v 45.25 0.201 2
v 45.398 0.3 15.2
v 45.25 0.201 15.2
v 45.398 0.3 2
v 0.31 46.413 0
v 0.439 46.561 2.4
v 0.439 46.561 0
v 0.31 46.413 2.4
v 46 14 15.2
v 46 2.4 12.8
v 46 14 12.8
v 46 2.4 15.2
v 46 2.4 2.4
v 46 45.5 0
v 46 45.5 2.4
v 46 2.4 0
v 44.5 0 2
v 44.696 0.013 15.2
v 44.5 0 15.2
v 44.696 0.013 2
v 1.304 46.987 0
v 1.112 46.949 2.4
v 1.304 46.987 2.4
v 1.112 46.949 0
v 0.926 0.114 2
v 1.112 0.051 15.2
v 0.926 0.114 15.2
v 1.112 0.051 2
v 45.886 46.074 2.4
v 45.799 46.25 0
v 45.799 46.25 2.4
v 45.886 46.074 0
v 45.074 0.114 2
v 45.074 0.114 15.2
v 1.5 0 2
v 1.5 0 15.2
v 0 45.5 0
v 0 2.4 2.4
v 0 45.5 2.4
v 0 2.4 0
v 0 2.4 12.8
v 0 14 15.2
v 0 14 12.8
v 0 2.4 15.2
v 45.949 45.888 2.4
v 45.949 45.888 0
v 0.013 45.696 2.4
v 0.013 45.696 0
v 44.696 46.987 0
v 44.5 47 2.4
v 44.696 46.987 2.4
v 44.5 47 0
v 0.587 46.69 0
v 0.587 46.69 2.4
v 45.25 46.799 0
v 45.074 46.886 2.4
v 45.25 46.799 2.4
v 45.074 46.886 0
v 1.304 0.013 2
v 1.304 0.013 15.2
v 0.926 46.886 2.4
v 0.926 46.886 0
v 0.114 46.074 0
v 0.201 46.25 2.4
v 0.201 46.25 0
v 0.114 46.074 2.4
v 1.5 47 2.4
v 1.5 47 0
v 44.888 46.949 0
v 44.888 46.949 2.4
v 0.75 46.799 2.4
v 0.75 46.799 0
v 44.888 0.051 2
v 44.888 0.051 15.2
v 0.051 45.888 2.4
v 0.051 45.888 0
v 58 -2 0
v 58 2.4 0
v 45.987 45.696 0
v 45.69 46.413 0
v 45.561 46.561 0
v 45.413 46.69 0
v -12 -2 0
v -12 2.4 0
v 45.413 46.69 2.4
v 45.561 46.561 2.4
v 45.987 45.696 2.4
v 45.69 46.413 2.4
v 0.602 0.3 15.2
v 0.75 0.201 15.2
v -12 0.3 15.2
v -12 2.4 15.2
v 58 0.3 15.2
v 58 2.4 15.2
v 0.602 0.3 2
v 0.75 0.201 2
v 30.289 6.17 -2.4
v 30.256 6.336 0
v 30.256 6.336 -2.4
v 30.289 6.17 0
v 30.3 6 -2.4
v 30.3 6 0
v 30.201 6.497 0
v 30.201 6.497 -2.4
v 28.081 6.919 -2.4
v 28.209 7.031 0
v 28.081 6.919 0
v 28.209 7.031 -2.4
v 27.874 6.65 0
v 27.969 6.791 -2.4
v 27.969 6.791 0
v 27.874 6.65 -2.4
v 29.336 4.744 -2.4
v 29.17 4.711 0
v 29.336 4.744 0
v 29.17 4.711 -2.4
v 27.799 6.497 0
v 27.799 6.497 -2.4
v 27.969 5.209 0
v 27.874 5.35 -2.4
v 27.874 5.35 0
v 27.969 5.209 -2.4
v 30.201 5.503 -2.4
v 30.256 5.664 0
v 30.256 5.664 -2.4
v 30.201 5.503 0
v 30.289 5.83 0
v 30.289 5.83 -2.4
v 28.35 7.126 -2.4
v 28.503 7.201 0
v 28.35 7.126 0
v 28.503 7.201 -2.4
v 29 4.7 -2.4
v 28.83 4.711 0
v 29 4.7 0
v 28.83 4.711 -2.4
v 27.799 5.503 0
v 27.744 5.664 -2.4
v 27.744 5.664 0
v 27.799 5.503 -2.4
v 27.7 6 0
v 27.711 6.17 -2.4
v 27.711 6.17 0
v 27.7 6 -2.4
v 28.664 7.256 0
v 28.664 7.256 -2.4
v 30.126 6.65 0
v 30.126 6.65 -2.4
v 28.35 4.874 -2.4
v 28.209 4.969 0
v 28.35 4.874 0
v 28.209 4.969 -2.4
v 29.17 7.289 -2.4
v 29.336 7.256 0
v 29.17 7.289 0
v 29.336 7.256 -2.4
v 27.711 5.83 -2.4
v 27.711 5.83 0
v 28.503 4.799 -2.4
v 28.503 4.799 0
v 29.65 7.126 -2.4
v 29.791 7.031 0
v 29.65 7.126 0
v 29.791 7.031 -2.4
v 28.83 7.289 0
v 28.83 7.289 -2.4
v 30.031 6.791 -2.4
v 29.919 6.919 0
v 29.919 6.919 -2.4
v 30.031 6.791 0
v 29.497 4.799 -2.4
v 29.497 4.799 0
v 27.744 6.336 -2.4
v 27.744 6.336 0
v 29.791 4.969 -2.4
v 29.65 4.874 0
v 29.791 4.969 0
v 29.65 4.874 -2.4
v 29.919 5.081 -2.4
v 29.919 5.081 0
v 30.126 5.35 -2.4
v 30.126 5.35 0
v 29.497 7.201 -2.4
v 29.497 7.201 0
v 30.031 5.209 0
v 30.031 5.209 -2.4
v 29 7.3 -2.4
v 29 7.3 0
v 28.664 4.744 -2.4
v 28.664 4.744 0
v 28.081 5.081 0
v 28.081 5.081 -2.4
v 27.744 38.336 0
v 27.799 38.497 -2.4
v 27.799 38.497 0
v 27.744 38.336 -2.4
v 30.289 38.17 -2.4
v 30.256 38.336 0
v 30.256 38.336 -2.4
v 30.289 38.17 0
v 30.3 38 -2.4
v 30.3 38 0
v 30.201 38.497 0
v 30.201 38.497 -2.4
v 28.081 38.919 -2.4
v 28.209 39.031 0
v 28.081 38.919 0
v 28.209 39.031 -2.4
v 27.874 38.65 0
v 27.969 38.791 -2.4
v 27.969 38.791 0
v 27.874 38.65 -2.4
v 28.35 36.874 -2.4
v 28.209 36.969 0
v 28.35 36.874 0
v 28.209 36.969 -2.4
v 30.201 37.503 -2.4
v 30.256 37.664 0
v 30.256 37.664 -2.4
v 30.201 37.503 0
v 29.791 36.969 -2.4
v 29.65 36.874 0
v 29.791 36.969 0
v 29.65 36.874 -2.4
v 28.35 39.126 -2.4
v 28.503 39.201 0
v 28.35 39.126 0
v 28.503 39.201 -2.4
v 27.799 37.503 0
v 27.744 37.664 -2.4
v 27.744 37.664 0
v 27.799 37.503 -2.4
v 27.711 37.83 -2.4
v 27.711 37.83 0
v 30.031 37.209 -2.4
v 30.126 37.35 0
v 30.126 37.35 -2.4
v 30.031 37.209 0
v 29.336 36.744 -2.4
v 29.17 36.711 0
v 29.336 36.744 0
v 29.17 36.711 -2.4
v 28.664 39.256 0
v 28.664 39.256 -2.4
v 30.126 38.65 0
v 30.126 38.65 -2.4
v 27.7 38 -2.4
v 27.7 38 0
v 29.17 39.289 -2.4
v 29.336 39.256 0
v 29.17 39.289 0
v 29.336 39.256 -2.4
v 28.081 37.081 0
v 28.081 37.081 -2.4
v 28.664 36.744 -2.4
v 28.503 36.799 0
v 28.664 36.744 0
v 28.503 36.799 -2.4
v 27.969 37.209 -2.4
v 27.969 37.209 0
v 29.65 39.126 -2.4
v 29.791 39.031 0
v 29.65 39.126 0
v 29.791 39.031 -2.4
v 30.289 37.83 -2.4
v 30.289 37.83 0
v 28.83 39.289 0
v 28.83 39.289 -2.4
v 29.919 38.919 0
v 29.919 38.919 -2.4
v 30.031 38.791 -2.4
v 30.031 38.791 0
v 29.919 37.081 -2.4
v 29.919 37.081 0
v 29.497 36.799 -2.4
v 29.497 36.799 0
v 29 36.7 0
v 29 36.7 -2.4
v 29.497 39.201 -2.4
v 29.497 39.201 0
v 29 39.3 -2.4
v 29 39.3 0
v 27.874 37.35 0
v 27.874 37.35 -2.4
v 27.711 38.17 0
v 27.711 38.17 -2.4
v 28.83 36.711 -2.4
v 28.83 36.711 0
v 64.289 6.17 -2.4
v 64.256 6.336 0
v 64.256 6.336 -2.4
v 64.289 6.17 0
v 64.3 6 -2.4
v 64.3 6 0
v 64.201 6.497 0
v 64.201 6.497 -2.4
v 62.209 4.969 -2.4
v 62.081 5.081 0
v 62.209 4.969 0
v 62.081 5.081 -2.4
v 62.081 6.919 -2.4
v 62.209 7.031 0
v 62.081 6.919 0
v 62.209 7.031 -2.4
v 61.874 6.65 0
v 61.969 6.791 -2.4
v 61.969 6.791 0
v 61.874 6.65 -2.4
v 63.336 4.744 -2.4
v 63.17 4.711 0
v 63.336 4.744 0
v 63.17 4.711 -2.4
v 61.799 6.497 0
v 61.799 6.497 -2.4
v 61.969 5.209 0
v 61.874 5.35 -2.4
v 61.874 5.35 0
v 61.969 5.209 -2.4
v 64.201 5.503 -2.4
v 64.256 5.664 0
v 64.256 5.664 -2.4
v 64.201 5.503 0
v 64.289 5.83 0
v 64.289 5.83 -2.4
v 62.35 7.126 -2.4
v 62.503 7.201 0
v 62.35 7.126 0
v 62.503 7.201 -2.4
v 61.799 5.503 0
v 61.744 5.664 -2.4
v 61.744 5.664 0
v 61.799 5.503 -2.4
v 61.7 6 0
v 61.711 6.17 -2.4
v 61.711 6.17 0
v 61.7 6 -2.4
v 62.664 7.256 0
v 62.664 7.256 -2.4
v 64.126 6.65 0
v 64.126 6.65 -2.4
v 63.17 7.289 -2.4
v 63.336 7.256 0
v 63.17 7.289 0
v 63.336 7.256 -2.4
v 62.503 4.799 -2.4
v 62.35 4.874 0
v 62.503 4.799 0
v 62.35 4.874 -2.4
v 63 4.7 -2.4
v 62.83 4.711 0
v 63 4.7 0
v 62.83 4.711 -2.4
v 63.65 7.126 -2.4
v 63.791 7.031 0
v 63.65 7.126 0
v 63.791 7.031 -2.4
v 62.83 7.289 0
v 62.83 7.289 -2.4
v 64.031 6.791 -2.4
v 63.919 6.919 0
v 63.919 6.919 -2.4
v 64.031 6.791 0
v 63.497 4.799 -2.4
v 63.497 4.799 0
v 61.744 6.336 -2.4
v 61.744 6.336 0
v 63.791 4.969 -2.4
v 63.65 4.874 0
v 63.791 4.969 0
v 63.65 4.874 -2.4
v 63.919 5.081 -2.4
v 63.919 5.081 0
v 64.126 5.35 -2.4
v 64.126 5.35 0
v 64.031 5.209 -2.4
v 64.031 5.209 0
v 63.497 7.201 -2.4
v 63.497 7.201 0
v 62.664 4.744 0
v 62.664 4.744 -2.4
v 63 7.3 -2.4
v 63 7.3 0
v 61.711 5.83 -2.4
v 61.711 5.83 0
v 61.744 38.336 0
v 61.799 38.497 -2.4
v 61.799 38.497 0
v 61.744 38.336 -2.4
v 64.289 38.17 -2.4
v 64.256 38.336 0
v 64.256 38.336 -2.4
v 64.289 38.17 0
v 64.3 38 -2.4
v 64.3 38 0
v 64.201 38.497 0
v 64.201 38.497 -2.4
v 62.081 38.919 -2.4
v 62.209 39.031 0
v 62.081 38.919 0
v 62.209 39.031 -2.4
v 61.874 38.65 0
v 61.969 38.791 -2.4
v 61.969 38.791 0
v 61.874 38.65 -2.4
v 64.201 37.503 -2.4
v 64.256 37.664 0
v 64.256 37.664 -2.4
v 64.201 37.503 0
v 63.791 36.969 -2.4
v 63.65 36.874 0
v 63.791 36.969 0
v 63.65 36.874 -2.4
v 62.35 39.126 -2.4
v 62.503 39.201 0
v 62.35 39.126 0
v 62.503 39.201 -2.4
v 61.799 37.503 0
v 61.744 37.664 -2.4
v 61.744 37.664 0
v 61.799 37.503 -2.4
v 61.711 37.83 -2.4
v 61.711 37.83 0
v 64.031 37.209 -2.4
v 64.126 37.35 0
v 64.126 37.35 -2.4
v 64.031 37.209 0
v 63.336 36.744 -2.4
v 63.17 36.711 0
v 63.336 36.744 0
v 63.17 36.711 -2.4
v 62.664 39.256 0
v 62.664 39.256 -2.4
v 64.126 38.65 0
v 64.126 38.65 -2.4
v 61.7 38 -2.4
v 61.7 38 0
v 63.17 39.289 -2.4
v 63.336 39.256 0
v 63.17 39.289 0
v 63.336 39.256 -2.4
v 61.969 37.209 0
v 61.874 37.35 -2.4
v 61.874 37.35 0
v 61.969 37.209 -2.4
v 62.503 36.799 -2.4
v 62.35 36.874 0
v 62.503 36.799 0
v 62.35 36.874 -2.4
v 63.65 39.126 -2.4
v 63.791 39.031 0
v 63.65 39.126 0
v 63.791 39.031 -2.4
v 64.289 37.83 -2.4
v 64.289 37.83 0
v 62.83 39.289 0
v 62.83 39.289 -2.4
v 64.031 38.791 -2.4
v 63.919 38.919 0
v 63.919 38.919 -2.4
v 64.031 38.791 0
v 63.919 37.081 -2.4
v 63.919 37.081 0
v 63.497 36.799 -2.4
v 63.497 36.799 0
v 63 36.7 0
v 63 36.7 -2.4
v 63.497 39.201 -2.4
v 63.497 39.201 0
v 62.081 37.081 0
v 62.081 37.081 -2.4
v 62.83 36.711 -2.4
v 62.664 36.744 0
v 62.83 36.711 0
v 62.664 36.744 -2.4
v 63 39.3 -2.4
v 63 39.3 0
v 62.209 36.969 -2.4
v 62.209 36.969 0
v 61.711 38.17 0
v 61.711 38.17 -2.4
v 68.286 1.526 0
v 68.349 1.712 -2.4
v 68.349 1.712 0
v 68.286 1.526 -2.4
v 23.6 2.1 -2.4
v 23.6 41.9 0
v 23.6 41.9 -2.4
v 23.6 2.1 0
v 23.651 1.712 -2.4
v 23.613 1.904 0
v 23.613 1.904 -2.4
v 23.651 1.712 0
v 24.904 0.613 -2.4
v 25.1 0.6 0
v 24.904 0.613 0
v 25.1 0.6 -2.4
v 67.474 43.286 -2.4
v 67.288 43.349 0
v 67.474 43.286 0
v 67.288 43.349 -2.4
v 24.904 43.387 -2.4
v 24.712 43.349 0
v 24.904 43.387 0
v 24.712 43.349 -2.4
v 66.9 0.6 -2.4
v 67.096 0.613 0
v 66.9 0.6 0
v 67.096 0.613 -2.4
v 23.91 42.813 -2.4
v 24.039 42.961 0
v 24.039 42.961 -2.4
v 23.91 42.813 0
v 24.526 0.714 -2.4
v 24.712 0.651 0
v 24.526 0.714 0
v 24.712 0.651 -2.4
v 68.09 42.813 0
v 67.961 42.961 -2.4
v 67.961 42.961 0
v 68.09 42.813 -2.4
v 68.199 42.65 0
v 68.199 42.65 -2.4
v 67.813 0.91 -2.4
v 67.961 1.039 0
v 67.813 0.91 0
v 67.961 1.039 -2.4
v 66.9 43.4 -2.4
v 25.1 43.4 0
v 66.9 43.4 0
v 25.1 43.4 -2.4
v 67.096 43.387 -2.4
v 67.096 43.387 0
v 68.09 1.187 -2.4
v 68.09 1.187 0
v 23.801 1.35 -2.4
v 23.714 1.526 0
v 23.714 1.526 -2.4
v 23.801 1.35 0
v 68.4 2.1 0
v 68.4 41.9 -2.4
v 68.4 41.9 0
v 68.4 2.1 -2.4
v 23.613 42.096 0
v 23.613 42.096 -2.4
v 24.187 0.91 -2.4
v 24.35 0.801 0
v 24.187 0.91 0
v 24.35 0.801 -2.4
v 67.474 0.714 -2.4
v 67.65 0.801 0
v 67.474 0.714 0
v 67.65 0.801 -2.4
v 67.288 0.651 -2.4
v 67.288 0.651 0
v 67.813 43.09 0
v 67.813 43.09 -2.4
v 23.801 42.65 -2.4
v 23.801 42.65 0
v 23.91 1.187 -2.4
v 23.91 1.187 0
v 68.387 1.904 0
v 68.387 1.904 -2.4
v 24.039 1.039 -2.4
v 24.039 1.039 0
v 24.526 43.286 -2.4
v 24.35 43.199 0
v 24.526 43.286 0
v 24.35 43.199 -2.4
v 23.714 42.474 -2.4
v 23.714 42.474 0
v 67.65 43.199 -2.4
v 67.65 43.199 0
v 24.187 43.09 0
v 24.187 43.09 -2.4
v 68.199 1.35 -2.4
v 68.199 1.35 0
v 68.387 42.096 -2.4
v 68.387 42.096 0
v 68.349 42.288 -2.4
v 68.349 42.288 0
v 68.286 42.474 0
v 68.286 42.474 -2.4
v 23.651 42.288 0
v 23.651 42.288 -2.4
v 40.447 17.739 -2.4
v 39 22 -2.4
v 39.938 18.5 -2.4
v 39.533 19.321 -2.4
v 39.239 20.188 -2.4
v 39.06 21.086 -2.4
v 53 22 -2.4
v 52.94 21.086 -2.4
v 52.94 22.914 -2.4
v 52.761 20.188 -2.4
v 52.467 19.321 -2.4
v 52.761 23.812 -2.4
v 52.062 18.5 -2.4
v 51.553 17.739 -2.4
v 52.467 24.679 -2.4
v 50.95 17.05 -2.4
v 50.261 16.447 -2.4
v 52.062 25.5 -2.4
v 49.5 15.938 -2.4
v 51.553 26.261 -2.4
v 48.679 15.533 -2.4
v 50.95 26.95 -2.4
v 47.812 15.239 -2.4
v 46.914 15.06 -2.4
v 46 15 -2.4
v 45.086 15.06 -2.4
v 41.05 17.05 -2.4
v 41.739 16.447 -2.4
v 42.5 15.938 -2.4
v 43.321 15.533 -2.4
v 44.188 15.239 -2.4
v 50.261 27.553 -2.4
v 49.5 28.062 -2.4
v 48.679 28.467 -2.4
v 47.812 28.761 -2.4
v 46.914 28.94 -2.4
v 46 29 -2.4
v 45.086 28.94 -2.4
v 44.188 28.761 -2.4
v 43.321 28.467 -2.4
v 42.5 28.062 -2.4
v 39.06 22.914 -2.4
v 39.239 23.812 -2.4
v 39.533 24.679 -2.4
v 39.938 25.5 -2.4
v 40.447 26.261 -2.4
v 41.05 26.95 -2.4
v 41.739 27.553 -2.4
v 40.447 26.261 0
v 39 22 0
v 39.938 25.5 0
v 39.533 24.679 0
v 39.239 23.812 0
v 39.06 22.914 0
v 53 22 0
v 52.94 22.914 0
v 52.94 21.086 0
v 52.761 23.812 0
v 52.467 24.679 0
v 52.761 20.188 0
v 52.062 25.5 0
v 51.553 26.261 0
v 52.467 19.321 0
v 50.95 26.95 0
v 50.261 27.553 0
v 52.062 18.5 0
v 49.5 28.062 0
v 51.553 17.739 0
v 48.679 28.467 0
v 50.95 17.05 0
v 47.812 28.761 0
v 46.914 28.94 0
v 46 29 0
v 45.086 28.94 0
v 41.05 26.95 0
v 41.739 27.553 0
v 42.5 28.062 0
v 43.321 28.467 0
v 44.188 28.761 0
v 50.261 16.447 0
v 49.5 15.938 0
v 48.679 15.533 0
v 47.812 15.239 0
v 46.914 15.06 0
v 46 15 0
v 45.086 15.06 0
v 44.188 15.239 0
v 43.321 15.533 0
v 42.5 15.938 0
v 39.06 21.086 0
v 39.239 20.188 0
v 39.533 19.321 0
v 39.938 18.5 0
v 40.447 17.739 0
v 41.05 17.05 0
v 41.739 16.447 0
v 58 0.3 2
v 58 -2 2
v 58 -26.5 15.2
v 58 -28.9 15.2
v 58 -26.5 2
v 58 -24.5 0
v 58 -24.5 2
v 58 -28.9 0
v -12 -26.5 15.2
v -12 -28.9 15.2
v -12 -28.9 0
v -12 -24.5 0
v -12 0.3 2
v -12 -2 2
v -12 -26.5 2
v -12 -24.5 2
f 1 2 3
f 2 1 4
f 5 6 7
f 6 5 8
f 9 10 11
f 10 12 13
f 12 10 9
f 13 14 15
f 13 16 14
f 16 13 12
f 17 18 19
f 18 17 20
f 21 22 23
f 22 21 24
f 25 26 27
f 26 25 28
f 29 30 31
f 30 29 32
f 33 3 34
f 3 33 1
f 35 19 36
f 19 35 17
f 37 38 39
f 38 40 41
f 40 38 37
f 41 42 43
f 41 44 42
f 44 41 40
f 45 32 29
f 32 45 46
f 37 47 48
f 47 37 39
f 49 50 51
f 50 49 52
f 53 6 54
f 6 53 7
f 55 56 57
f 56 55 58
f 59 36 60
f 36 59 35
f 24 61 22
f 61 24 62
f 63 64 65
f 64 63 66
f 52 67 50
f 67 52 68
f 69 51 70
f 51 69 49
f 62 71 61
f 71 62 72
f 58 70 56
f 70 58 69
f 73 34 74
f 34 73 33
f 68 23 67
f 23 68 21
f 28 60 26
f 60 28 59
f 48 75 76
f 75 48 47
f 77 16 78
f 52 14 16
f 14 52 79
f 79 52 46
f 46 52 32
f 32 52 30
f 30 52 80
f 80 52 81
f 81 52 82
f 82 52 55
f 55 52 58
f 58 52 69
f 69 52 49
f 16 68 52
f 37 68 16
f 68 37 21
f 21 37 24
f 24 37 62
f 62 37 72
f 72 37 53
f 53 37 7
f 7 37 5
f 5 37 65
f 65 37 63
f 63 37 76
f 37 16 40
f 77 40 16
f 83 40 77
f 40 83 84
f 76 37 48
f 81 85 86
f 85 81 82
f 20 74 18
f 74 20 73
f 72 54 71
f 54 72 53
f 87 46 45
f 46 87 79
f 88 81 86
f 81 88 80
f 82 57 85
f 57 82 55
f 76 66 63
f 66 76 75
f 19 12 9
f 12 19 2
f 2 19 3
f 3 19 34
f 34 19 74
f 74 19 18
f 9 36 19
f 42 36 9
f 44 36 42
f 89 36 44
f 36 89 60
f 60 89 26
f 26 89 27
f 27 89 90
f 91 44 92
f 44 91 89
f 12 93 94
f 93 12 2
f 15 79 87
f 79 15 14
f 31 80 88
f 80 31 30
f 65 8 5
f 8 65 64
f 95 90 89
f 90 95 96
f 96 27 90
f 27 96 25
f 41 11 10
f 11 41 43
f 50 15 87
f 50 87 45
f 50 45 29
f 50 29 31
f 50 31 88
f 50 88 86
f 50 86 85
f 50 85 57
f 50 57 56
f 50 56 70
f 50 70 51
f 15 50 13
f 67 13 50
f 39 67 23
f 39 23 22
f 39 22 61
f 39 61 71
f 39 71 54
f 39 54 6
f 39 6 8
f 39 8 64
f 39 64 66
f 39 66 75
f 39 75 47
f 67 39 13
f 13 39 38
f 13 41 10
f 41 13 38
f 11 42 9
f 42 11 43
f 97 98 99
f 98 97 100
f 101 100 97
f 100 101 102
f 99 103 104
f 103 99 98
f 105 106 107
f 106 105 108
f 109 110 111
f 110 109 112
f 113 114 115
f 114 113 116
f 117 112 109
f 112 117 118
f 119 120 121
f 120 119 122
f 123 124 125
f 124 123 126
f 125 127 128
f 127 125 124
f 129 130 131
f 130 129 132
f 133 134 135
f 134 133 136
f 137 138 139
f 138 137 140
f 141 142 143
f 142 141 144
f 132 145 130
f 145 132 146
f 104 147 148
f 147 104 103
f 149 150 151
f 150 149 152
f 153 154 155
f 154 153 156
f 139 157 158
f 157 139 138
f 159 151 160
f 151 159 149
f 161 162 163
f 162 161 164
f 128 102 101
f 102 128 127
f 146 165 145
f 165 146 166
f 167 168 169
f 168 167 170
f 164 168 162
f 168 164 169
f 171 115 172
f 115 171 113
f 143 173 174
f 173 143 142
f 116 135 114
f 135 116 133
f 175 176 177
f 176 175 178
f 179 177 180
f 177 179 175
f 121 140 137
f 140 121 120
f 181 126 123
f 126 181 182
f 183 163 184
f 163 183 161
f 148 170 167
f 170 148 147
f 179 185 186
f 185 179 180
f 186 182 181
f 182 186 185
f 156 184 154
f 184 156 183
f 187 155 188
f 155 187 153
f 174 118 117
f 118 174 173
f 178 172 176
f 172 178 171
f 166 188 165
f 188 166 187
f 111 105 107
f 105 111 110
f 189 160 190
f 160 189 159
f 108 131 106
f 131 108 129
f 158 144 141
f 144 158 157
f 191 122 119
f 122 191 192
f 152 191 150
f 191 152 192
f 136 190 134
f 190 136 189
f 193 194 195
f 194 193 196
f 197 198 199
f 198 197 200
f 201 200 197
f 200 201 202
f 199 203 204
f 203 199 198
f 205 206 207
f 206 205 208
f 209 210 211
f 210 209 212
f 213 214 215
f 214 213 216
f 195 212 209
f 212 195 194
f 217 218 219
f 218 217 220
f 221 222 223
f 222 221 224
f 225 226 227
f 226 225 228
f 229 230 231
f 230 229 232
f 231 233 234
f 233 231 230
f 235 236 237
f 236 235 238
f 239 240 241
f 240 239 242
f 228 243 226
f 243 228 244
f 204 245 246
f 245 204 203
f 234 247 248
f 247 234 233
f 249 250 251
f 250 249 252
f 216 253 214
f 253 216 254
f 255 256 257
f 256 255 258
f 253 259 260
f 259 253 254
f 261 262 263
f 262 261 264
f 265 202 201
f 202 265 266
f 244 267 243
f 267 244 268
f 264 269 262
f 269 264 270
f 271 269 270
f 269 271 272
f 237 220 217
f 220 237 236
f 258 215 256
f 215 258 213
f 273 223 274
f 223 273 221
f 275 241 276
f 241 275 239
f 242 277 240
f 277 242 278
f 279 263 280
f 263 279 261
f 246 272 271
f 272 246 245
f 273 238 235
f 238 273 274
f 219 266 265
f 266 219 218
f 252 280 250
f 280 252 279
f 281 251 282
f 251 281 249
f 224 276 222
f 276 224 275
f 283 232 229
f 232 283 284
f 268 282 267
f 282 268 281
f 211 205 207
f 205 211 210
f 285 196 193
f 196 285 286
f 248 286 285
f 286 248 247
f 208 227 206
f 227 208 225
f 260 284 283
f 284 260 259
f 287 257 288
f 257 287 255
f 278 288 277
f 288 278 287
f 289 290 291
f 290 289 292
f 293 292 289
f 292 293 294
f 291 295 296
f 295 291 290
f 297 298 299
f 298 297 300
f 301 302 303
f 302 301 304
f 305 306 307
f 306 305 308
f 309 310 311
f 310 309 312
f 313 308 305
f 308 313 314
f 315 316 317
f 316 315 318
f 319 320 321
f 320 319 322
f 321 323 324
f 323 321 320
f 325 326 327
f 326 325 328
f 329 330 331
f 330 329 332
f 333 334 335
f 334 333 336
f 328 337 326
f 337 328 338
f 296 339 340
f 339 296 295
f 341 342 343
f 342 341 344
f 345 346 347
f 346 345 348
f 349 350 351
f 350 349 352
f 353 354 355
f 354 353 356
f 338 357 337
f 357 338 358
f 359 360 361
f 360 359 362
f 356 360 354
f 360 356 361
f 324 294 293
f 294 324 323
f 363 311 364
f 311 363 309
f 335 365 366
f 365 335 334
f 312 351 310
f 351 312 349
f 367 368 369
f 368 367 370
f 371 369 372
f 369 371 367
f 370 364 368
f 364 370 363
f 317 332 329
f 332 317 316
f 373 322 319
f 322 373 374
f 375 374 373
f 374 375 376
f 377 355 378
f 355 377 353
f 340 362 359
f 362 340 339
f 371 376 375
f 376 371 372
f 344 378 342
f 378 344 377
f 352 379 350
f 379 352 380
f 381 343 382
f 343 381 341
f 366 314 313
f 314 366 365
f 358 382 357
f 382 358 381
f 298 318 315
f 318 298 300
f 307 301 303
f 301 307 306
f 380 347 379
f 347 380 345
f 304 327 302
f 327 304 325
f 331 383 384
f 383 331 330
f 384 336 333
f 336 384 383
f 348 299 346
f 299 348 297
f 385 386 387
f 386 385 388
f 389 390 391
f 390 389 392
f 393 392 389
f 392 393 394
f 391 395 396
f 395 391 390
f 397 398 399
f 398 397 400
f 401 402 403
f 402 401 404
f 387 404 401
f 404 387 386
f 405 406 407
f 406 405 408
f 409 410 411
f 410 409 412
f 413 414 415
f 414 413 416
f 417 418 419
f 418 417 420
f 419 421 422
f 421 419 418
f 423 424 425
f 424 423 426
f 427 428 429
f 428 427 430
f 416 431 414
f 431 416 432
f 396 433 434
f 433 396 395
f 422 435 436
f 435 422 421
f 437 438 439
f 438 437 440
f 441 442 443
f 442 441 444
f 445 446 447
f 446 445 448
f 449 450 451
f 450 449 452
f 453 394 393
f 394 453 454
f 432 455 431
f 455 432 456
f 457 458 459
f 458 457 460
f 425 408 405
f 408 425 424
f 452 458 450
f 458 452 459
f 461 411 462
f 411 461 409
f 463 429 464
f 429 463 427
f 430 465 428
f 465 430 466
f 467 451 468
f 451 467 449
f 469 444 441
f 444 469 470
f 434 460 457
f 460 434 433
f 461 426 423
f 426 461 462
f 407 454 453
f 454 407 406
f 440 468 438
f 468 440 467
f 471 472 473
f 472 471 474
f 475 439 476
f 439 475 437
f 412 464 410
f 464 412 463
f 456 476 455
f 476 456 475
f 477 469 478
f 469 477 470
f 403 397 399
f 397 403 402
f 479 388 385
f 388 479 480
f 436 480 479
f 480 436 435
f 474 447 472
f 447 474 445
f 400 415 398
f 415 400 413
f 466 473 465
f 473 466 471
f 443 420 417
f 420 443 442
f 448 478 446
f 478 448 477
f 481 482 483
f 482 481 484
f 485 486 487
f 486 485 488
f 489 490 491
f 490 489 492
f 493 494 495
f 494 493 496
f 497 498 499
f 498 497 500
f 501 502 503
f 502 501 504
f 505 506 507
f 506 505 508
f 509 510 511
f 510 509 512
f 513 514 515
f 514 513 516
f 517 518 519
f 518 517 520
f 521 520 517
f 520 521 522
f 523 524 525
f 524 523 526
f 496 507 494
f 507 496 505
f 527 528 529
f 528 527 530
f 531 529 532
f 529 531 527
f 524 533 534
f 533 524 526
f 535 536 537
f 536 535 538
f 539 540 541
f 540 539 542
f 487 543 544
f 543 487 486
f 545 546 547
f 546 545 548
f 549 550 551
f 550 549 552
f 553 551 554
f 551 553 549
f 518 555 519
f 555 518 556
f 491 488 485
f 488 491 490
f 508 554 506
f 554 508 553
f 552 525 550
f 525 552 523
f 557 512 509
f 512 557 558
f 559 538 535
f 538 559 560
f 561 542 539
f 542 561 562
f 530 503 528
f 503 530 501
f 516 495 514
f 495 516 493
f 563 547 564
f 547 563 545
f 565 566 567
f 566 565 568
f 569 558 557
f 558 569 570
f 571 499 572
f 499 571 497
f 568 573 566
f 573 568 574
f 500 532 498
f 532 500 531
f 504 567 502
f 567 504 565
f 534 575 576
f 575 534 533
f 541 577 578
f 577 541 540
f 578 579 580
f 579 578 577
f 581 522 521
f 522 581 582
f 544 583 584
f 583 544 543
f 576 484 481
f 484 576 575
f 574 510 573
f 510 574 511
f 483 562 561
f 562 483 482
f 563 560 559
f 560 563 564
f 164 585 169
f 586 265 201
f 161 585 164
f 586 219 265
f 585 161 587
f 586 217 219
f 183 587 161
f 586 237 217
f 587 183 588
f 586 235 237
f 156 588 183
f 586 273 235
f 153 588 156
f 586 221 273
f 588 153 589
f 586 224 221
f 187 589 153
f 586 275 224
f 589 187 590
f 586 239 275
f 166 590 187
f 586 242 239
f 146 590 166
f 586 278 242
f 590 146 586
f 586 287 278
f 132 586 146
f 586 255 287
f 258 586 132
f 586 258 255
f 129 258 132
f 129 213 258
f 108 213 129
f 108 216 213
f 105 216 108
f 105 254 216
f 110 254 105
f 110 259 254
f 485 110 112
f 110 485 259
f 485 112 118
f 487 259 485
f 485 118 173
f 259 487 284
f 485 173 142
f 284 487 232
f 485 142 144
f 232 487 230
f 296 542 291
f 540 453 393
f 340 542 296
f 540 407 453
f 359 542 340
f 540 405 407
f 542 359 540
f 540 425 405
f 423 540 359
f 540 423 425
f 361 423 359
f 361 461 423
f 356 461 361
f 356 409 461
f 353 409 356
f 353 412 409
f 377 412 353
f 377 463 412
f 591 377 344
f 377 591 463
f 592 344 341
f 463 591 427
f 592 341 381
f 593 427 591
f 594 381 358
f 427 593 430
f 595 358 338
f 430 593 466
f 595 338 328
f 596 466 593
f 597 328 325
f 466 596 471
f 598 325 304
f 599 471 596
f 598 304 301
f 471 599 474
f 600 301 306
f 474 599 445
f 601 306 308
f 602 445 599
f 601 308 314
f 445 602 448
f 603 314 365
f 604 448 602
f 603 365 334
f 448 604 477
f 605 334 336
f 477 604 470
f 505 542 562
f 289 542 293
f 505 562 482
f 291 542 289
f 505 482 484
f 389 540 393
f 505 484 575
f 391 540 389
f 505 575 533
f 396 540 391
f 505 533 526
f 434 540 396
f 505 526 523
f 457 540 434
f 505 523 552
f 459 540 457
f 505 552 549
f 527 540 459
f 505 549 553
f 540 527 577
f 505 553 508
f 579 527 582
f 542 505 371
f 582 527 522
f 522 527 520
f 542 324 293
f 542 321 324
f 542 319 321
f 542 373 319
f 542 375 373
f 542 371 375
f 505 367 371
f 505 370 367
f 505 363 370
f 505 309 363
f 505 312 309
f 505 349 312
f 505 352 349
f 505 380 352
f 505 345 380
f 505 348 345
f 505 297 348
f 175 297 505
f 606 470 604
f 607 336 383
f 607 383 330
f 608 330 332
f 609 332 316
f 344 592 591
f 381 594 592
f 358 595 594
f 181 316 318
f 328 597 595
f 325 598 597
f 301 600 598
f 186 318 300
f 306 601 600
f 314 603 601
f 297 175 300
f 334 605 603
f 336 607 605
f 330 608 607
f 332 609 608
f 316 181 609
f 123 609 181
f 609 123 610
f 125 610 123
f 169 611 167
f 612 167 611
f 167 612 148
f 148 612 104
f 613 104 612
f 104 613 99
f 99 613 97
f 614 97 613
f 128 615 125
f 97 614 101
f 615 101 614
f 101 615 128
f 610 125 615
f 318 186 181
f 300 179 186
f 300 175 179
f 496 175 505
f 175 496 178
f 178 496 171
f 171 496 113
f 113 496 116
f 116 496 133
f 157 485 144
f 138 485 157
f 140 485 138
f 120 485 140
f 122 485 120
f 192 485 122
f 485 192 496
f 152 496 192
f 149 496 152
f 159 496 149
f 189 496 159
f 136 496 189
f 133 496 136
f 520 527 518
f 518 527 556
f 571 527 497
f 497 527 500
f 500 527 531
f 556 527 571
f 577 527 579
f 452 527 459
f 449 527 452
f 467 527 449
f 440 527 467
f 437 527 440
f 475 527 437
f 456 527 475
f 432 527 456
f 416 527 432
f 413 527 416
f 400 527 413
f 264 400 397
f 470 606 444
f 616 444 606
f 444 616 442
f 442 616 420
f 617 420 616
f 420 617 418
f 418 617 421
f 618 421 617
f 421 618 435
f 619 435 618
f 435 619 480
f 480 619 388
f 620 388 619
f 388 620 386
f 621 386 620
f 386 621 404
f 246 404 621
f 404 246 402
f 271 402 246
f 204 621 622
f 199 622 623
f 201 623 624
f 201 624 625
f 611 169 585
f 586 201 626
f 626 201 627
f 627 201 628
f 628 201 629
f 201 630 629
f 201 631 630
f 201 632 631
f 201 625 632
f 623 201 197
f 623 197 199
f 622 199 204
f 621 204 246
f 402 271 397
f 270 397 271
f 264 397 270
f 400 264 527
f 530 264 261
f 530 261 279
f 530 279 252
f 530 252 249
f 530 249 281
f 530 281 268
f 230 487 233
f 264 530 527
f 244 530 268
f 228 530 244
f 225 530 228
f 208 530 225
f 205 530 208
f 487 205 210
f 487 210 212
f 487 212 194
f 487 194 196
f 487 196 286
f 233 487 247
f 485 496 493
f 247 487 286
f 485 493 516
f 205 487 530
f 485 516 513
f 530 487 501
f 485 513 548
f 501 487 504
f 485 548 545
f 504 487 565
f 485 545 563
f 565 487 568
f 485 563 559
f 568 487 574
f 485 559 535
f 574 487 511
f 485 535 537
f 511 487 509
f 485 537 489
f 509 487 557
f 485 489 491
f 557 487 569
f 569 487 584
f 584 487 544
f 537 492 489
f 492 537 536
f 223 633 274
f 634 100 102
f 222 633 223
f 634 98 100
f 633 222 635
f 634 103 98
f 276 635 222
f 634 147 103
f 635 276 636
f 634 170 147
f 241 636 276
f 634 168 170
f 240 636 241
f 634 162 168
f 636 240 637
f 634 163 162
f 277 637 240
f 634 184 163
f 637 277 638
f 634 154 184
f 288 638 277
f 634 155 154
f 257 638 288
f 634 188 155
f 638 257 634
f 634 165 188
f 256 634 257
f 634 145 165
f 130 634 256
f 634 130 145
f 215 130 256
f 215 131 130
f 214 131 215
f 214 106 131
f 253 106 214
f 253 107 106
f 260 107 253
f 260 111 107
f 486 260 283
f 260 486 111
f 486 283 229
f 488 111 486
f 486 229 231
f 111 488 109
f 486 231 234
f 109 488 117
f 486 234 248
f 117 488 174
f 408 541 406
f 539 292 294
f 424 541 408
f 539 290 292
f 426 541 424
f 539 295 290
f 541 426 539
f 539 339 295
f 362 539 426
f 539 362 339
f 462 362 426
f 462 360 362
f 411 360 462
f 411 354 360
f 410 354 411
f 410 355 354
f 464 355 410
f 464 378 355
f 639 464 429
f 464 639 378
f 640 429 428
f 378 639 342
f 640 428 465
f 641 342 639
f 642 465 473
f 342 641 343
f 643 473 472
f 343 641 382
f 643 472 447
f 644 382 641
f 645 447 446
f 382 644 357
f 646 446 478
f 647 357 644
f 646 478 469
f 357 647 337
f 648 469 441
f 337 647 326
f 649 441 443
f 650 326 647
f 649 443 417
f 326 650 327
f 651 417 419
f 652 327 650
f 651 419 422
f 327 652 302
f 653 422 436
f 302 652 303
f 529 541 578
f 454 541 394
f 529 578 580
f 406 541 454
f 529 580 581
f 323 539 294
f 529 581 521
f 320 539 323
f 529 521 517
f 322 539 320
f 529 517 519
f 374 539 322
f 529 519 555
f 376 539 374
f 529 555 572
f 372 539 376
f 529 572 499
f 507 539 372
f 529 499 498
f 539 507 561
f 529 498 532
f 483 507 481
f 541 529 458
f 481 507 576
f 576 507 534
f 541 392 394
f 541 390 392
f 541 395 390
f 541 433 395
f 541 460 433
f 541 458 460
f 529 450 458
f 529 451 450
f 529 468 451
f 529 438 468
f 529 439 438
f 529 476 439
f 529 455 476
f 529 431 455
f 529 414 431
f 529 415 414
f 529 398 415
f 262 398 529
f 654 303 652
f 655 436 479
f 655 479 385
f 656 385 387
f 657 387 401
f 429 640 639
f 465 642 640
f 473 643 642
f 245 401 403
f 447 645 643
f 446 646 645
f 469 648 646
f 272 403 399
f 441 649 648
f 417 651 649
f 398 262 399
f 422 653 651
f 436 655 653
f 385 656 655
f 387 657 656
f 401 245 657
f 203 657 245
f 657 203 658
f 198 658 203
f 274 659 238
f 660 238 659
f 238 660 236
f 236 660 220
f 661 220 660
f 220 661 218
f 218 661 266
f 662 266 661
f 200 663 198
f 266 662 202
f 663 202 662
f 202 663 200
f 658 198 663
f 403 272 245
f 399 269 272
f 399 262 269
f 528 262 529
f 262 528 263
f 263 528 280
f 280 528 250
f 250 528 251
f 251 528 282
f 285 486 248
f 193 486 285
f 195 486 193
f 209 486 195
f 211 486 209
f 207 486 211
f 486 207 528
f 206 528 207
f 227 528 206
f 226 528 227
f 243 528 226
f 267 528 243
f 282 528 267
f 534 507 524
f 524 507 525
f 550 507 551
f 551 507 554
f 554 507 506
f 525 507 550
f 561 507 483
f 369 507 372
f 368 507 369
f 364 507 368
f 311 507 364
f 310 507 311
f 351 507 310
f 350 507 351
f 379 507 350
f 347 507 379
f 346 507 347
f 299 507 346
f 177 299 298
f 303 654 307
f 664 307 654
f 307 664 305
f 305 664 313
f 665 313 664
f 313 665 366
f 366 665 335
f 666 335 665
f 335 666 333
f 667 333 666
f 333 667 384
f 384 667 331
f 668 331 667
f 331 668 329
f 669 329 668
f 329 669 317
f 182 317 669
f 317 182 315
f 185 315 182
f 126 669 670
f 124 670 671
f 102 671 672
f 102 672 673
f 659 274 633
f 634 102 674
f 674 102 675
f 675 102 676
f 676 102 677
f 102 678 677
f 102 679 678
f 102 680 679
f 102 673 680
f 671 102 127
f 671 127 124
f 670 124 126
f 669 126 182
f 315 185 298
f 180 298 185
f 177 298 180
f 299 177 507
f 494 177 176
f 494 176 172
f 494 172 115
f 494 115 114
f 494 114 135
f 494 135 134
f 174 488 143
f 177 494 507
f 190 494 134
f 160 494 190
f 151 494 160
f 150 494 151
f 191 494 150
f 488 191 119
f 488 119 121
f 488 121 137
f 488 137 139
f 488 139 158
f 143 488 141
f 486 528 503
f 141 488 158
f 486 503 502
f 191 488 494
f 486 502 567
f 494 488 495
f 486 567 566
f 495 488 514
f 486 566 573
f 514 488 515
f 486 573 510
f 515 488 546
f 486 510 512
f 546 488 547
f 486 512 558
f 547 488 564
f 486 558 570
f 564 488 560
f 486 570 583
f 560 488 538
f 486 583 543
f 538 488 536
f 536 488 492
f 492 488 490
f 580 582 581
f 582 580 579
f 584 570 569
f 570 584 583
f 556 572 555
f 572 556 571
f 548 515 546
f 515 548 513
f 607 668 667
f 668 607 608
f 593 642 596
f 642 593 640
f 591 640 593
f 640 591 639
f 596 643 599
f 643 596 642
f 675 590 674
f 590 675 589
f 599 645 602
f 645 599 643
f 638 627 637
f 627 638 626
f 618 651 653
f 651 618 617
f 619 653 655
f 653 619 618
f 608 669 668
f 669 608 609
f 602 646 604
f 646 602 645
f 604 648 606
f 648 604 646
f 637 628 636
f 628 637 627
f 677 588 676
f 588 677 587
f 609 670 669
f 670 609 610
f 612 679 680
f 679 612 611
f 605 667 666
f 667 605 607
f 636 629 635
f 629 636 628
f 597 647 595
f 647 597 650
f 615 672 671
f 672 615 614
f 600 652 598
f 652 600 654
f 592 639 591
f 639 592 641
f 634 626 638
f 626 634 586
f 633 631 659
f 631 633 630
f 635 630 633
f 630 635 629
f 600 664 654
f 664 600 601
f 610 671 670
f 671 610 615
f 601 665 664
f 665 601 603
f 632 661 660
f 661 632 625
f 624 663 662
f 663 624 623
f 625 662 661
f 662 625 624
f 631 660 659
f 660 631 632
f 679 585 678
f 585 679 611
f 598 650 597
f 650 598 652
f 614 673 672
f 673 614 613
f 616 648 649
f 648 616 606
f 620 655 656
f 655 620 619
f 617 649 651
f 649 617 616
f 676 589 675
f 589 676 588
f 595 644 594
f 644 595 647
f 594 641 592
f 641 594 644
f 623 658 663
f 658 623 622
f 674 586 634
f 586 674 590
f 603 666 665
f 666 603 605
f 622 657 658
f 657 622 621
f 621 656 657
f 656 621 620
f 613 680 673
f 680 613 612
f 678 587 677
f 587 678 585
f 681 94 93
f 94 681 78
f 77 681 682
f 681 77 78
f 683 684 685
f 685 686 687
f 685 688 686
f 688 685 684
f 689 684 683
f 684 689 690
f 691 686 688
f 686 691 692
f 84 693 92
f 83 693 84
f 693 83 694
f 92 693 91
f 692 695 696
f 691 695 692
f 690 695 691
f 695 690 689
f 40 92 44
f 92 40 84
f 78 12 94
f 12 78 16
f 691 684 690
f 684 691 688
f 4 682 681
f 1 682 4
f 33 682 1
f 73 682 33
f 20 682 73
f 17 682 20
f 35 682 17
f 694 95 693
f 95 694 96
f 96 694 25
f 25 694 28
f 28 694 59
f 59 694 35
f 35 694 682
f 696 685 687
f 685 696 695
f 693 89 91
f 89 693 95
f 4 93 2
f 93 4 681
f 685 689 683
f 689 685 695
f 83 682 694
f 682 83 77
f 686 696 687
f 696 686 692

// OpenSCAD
// CleanScan depth module clip: holds a MaixSense A010 next to the phone's rear camera and
// an ESP32-S3 board on top. Print in PETG or PLA, 0.2 mm layers, 30 % infill, no supports
// (print with the back plate flat on the bed).
//
// Measure YOUR phone and boards and change the parameters below; the defaults fit an
// iPhone 11 in a thin case, a MaixSense A010 and an ESP32-S3-DevKitC-1.
//
// SPDX-License-Identifier: CERN-OHL-P-2.0
// Copyright 2026 CleanScan contributors

/* [Phone] */
phone_thickness   = 9.8;   // mm, including the case
camera_from_top   = 22;    // mm, phone's top edge to the centre of the main rear camera
camera_from_side  = 22;    // mm, phone's side edge to the camera centre
grip_depth        = 14;    // mm the jaws reach over the front and back of the phone
clip_width        = 46;    // mm along the phone's top edge

/* [A010 depth camera] */
a010_w            = 40;    // mm (measure your module)
a010_h            = 38;    // mm
a010_lens_d       = 14;    // mm, opening for the lens (with margin)
a010_lens_dx      = 0;     // mm, lens offset from the module centre
a010_hole_d       = 2.6;   // M2.5 mounting holes
a010_hole_dx      = 34;    // hole spacing, x
a010_hole_dy      = 32;    // hole spacing, y

/* [ESP32-S3 board] */
esp_l             = 70;    // mm (DevKitC-1: 69 x 25.5; XIAO ESP32S3: 21 x 17.5)
esp_w             = 26.5;
esp_rail          = 2;     // mm, rails the board slides into

/* [Print] */
wall              = 2.4;
gap               = 0.3;   // printing tolerance
$fn               = 48;

back_h = camera_from_top + a010_h / 2 + 6;  // the back plate reaches down past the camera

module rounded_box(size, r = 1.5) {
    hull() for (x = [r, size[0] - r], y = [r, size[1] - r])
        translate([x, y, 0]) cylinder(r = r, h = size[2]);
}

// C-shaped jaw over the phone's top edge (phone lies in the x-y plane, top edge along x)
module jaw() {
    t = phone_thickness + 2 * gap;
    difference() {
        rounded_box([clip_width, back_h, t + 2 * wall]);
        translate([-1, wall, wall]) cube([clip_width + 2, back_h + 1, t]);  // phone slot below the top wall
        // front lip only reaches grip_depth over the screen
        translate([-1, grip_depth, wall + t - 0.01]) cube([clip_width + 2, back_h, wall + 1]);
    }
}

// A010 holder on the back plate, lens next to the phone camera (same direction)
module a010_mount() {
    cx = camera_from_side + a010_w / 2 + 4;  // module beside the camera, 4 mm gap
    cy = camera_from_top;
    translate([cx - a010_w / 2 - wall, cy - a010_h / 2 - wall, -wall])
        difference() {
            rounded_box([a010_w + 2 * wall, a010_h + 2 * wall, wall]);
            translate([wall + a010_w / 2 + a010_lens_dx, wall + a010_h / 2, -1])
                cylinder(d = a010_lens_d, h = wall + 2);
            for (sx = [-1, 1], sy = [-1, 1])
                translate([wall + a010_w / 2 + sx * a010_hole_dx / 2, wall + a010_h / 2 + sy * a010_hole_dy / 2, -1])
                    cylinder(d = a010_hole_d, h = wall + 2);
        }
}

// rails on top of the jaw for the ESP32 board (USB connector facing the side)
module esp_rails() {
    t = phone_thickness + 2 * gap + 2 * wall;
    translate([(clip_width - esp_l) / 2, -esp_w - wall, 0])
        difference() {
            cube([esp_l, esp_w + 2 * wall, t]);
            translate([-1, wall, esp_rail]) cube([esp_l + 2, esp_w + gap, t]);
            translate([-1, wall + esp_rail, -1]) cube([esp_l + 2, esp_w - 2 * esp_rail, esp_rail + 2]);
        }
}

jaw();
a010_mount();
esp_rails();
